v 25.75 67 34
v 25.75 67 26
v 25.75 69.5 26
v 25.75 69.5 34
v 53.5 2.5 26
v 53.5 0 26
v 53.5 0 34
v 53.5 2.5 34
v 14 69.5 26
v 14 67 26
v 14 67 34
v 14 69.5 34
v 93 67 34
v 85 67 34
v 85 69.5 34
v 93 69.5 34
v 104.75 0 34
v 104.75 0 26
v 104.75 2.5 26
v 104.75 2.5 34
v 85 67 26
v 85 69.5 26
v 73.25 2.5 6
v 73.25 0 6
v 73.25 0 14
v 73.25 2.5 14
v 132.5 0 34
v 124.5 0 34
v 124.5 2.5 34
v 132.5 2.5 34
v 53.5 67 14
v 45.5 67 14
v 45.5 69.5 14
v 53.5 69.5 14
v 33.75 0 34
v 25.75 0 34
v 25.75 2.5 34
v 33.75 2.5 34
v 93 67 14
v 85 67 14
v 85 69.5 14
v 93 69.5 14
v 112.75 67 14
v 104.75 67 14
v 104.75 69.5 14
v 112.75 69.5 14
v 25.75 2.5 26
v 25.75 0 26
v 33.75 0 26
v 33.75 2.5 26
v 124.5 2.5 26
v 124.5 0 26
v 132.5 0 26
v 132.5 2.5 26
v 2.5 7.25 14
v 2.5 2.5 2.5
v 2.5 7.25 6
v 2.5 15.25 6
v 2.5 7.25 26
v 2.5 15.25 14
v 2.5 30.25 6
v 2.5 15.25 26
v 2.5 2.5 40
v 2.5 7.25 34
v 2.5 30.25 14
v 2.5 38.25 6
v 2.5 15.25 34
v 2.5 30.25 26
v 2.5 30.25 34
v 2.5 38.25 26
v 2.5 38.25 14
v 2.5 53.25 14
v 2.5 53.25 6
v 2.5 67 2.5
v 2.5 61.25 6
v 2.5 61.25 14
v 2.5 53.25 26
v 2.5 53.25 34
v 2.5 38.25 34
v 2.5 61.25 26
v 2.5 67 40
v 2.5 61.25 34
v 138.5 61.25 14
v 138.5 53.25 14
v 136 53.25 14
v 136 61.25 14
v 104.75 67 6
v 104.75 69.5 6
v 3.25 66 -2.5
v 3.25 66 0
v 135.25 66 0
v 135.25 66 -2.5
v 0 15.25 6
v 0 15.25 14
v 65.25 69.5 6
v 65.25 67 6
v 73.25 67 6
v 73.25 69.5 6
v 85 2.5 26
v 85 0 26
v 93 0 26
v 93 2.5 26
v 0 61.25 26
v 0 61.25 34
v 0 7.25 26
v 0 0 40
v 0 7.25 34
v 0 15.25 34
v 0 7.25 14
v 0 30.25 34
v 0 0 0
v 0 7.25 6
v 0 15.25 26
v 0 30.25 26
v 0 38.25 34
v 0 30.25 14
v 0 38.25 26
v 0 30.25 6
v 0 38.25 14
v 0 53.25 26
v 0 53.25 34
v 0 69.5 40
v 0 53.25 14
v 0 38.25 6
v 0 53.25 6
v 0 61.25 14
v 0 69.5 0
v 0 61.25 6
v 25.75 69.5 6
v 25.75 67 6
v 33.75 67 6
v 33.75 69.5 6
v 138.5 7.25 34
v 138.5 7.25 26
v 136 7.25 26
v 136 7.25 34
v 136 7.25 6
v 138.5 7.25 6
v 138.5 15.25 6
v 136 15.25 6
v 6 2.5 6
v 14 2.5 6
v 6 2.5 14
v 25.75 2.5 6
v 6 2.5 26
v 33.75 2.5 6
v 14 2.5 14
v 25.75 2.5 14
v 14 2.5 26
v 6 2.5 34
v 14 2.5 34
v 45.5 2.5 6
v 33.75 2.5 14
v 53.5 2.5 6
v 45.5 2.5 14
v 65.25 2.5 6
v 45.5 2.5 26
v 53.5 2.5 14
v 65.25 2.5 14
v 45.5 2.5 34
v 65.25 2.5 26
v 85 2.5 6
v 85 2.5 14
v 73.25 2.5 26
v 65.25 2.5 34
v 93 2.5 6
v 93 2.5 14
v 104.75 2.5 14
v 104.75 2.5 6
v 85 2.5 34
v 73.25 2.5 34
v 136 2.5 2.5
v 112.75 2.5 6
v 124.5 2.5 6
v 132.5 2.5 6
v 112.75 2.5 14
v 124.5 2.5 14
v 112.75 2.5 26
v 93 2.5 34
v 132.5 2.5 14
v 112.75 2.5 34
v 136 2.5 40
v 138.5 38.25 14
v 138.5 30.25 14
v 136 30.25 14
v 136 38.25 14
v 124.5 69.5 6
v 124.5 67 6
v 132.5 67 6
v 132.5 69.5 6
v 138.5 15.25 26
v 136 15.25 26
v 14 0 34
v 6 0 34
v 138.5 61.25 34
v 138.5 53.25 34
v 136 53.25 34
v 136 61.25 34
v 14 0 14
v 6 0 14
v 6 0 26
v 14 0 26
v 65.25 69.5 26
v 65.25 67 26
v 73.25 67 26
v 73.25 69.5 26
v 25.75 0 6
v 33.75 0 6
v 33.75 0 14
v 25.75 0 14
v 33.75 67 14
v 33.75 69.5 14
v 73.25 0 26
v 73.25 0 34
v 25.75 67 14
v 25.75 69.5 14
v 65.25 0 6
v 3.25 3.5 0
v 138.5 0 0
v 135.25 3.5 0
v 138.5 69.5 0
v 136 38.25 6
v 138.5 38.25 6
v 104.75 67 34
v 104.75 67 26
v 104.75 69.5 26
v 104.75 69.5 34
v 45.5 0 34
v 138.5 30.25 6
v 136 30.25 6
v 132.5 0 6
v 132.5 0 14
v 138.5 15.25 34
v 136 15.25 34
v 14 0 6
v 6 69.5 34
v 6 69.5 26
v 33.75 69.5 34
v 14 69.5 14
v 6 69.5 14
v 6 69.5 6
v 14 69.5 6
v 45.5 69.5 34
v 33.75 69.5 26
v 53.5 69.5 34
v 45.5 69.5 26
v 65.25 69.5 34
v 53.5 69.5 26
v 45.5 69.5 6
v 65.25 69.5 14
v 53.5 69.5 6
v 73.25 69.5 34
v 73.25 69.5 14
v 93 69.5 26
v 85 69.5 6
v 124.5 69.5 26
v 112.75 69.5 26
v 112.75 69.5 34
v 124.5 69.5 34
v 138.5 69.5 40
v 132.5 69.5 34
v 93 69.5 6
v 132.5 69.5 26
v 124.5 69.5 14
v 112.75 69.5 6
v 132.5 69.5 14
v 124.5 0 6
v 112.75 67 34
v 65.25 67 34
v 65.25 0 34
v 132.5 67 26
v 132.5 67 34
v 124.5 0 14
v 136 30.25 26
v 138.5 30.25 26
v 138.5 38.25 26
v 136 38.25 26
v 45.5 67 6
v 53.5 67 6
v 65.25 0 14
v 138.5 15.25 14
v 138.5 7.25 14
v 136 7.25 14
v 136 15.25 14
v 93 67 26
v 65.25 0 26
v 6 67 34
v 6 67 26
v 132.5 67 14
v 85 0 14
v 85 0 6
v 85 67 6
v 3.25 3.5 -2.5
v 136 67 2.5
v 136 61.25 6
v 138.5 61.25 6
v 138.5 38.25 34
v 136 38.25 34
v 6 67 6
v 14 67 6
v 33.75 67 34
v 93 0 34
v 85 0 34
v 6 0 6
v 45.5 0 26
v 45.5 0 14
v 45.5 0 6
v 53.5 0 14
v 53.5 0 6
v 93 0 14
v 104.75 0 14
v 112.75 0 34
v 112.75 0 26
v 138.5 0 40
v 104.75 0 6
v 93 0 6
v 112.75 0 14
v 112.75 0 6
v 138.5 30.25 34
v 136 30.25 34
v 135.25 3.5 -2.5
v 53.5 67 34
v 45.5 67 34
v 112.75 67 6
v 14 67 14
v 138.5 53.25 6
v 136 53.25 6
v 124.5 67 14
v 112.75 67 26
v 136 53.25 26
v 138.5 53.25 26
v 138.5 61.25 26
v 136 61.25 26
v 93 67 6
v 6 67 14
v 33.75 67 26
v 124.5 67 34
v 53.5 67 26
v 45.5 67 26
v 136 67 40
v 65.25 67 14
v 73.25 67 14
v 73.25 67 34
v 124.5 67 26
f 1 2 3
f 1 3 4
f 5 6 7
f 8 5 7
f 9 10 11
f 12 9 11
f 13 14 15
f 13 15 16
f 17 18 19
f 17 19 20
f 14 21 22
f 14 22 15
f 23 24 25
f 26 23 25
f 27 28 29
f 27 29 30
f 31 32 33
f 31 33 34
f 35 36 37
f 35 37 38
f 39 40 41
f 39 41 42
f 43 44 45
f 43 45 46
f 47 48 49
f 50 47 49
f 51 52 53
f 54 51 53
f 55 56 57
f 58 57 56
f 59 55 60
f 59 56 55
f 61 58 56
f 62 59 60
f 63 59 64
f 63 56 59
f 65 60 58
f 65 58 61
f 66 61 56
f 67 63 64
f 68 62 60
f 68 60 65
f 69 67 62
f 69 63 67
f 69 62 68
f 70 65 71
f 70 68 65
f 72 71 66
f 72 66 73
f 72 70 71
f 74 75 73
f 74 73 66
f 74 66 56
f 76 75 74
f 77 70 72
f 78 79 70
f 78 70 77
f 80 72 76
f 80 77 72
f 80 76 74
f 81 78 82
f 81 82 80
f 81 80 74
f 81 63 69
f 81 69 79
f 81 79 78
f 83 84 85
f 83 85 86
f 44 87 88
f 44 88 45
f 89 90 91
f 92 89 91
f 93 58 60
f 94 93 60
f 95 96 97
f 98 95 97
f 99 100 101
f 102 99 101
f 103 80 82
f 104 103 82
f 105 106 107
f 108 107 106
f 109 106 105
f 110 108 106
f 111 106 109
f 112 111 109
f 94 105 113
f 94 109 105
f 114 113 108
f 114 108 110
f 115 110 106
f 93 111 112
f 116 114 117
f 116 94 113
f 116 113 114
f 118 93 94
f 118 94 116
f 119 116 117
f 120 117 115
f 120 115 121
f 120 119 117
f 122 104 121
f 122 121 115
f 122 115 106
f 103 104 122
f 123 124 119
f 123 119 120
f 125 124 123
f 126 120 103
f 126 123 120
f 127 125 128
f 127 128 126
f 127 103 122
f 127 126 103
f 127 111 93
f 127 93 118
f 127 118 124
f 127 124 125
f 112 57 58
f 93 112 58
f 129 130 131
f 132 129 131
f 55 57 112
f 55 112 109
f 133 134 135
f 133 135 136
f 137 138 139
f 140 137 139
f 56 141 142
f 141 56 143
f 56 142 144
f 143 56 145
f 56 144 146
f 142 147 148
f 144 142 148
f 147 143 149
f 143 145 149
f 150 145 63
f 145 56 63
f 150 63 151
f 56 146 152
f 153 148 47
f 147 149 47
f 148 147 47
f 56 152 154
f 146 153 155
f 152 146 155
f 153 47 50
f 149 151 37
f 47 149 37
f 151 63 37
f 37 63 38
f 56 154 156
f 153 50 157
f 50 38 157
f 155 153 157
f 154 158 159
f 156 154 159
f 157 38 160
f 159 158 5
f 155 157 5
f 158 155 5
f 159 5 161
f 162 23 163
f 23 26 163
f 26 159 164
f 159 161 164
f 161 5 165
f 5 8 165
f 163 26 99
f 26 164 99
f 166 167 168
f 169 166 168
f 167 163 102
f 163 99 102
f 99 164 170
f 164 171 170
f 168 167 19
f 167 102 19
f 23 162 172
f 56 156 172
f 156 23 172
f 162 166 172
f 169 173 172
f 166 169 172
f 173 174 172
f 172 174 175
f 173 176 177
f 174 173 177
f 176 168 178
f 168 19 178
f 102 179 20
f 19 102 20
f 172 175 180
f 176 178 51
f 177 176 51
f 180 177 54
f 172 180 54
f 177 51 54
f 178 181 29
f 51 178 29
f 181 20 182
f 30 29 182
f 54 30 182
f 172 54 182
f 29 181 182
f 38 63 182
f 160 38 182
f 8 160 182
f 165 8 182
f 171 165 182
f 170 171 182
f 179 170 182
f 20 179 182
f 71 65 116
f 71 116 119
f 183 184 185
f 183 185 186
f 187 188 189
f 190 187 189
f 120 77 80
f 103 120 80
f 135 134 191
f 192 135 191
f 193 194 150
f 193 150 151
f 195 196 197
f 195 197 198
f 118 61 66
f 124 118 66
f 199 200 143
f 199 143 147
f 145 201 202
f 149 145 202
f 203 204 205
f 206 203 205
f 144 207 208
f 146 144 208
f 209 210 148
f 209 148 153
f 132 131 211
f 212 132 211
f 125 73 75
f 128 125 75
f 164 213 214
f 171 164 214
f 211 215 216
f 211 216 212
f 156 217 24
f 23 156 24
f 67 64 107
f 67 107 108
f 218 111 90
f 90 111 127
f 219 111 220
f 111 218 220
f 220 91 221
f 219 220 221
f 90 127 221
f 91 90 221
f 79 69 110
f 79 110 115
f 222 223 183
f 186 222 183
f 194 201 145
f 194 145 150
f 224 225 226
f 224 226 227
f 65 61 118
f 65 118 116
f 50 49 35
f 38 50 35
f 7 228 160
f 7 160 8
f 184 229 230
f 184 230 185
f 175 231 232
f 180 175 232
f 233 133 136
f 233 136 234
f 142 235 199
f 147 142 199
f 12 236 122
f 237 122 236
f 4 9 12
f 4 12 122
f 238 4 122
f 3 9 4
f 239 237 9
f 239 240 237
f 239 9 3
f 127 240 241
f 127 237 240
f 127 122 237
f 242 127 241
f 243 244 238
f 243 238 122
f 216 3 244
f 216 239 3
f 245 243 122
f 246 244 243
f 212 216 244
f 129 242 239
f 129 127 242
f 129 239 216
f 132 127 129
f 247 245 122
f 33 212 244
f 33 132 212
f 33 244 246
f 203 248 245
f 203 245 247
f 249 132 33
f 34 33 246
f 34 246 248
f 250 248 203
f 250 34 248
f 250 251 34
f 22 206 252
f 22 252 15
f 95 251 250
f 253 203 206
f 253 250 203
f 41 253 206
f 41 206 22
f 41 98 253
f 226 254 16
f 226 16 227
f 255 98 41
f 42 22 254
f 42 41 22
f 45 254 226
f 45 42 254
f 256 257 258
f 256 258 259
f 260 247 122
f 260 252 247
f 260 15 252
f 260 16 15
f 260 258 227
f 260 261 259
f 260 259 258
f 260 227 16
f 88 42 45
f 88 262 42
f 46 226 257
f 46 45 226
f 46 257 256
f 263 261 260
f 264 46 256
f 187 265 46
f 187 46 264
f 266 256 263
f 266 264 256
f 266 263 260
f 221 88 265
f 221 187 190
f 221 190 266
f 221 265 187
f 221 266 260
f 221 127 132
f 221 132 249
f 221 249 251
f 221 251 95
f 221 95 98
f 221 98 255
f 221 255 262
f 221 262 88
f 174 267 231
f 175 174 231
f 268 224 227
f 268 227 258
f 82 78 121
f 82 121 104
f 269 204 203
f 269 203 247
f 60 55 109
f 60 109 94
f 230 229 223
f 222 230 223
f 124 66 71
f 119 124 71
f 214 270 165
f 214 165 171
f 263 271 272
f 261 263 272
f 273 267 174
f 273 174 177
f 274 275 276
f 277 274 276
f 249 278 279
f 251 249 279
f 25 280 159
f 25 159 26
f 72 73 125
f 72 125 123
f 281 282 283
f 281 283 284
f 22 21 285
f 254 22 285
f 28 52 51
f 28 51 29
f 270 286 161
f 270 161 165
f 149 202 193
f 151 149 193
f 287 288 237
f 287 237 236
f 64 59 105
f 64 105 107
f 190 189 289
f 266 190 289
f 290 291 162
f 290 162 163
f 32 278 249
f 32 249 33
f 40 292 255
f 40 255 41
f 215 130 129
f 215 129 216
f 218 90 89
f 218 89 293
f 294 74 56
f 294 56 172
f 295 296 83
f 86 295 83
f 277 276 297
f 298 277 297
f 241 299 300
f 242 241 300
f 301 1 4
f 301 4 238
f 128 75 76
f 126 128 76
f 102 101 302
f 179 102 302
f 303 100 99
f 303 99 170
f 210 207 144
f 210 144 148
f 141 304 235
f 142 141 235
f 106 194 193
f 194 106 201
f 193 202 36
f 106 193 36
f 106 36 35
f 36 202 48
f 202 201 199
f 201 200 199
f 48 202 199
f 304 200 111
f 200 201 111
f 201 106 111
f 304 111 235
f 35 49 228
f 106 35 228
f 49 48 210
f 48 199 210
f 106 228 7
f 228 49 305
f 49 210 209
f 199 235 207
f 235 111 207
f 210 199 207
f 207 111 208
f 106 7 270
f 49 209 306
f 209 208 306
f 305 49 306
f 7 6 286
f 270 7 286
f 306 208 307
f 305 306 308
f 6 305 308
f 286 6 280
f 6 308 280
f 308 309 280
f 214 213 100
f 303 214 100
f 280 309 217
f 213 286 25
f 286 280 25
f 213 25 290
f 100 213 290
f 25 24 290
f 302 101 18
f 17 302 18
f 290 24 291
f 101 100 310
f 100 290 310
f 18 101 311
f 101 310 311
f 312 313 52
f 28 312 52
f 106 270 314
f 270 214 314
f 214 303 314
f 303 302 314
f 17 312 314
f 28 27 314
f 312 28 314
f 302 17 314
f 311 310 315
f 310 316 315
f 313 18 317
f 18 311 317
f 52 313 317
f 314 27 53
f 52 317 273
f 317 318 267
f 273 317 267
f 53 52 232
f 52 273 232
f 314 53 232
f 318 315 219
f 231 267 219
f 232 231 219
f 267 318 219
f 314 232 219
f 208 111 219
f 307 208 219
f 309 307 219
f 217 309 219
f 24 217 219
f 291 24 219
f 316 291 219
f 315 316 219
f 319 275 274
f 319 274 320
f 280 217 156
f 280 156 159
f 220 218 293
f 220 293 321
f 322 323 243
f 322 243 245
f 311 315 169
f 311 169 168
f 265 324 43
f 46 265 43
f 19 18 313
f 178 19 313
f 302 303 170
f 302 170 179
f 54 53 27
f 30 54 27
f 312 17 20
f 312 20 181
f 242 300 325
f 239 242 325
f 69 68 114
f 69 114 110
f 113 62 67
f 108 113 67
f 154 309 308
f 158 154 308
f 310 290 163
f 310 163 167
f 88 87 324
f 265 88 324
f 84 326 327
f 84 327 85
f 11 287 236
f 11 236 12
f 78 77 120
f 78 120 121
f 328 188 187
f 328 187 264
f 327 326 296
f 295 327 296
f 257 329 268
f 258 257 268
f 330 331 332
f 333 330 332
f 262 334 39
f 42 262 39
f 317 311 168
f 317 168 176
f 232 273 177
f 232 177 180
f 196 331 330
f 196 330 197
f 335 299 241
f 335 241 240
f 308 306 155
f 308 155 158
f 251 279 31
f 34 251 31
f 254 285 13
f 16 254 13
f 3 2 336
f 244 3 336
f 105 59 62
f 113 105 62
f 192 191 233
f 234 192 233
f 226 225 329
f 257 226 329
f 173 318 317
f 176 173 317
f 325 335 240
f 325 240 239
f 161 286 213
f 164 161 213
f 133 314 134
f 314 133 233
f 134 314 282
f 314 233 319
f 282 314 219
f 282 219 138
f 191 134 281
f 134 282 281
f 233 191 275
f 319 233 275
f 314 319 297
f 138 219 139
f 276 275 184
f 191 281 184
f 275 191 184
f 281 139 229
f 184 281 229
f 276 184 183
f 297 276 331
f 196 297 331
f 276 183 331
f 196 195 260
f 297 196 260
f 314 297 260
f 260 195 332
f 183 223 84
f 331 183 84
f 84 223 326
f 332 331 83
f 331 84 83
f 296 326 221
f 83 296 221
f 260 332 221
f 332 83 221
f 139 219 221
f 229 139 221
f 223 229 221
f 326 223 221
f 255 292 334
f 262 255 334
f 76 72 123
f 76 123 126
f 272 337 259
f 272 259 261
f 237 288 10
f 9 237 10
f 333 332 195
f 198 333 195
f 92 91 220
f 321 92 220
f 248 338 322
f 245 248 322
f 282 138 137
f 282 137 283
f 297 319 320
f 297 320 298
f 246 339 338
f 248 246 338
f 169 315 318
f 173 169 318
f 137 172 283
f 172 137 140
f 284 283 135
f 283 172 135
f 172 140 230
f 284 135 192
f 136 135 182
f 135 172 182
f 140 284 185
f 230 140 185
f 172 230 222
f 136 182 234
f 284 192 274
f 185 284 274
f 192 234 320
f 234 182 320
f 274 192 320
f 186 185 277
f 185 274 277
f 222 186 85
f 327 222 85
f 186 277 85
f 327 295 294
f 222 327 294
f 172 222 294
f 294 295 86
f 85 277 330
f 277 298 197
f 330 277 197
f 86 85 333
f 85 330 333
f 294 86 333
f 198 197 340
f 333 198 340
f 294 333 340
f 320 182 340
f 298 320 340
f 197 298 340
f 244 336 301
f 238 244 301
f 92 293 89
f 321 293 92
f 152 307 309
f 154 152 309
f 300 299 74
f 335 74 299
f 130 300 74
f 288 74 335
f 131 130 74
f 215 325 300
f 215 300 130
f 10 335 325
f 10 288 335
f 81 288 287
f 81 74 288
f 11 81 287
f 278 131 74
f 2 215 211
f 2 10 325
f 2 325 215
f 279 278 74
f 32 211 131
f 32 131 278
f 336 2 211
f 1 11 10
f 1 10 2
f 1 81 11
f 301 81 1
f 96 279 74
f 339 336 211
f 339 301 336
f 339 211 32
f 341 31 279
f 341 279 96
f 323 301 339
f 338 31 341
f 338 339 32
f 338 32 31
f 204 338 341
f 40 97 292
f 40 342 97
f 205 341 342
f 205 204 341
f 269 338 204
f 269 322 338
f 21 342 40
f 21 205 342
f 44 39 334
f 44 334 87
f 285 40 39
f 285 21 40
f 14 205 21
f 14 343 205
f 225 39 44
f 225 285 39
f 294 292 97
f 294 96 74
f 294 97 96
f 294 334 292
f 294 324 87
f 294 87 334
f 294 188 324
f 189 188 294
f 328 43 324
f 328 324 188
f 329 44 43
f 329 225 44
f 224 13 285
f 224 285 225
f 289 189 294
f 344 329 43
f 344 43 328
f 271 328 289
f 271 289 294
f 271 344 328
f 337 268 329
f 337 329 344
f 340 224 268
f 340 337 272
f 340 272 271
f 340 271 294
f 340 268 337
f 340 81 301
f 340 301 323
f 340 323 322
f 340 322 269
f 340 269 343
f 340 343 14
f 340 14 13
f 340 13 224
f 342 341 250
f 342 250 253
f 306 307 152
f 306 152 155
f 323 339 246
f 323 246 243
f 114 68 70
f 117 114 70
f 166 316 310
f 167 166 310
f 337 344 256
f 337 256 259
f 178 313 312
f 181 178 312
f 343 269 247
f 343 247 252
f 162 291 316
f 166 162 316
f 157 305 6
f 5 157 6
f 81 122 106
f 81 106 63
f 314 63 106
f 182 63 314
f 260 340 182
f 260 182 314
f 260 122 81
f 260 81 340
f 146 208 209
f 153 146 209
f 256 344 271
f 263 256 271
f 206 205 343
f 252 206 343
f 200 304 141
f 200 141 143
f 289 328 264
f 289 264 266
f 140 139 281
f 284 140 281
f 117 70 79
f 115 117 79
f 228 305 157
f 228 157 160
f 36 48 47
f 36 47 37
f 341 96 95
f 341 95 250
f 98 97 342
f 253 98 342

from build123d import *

# Parameters (mm, degrees)
F0_W     = 138.5
F0_H     = 69.5
F1_DEPTH = 40
F2_W     = 133.5
F2_H     = 64.5
F3_DEPTH = 37.5
F4_W     = 132
F4_H     = 62.5
F5_DEPTH = 2.5
F6_W     = 8
F6_H     = 8
F7_DEPTH = 138.5
F8_W     = 8
F8_H     = 8
F9_DEPTH = 69.5


with BuildPart() as f1:
    # F0 (on Top) → F1 (new body)
    with BuildSketch(Plane.XY):
        with Locations((69.25, 34.75)):
            Rectangle(F0_W, F0_H)
    extrude(amount=F1_DEPTH)

    # F2 (on face) → F3 (cut)
    with BuildSketch(Plane.XY.offset(40)):
        with Locations((69.25, 34.75)):
            Rectangle(F2_W, F2_H)
    extrude(amount=-F3_DEPTH, mode=Mode.SUBTRACT)

    # F4 (on face) → F5 (join)
    with BuildSketch(Plane(origin=(0, 0, 0), x_dir=(1, 0, 0), z_dir=(0, 0, -1))):
        with Locations((69.25, -34.75)):
            Rectangle(F4_W, F4_H)
    extrude(amount=F5_DEPTH)

    # F6 (on face) → F7 (cut)
    with BuildSketch(Plane.YZ.offset(138.5)):
        with Locations((11.25, 30)):
            Rectangle(F6_W, F6_H)
        with Locations((11.25, 10)):
            Rectangle(F6_W, F6_H)
        with Locations((57.25, 10)):
            Rectangle(F6_W, F6_H)
        with Locations((57.25, 30)):
            Rectangle(F6_W, F6_H)
        with Locations((34.25, 30)):
            Rectangle(F6_W, F6_H)
        with Locations((34.25, 10)):
            Rectangle(F6_W, F6_H)
    extrude(amount=-F7_DEPTH, mode=Mode.SUBTRACT)

    # F8 (on face) → F9 (cut)
    with BuildSketch(Plane.XZ):
        with Locations((10, 30)):
            Rectangle(F8_W, F8_H)
        with Locations((10, 10)):
            Rectangle(F8_W, F8_H)
        with Locations((29.75, 10)):
            Rectangle(F8_W, F8_H)
        with Locations((29.75, 30)):
            Rectangle(F8_W, F8_H)
        with Locations((49.5, 30)):
            Rectangle(F8_W, F8_H)
        with Locations((49.5, 10)):
            Rectangle(F8_W, F8_H)
        with Locations((69.25, 10)):
            Rectangle(F8_W, F8_H)
        with Locations((69.25, 30)):
            Rectangle(F8_W, F8_H)
        with Locations((89, 30)):
            Rectangle(F8_W, F8_H)
        with Locations((89, 10)):
            Rectangle(F8_W, F8_H)
        with Locations((108.75, 10)):
            Rectangle(F8_W, F8_H)
        with Locations((108.75, 30)):
            Rectangle(F8_W, F8_H)
        with Locations((128.5, 30)):
            Rectangle(F8_W, F8_H)
        with Locations((128.5, 10)):
            Rectangle(F8_W, F8_H)
    extrude(amount=-F9_DEPTH, mode=Mode.SUBTRACT)


solid = f1.part
